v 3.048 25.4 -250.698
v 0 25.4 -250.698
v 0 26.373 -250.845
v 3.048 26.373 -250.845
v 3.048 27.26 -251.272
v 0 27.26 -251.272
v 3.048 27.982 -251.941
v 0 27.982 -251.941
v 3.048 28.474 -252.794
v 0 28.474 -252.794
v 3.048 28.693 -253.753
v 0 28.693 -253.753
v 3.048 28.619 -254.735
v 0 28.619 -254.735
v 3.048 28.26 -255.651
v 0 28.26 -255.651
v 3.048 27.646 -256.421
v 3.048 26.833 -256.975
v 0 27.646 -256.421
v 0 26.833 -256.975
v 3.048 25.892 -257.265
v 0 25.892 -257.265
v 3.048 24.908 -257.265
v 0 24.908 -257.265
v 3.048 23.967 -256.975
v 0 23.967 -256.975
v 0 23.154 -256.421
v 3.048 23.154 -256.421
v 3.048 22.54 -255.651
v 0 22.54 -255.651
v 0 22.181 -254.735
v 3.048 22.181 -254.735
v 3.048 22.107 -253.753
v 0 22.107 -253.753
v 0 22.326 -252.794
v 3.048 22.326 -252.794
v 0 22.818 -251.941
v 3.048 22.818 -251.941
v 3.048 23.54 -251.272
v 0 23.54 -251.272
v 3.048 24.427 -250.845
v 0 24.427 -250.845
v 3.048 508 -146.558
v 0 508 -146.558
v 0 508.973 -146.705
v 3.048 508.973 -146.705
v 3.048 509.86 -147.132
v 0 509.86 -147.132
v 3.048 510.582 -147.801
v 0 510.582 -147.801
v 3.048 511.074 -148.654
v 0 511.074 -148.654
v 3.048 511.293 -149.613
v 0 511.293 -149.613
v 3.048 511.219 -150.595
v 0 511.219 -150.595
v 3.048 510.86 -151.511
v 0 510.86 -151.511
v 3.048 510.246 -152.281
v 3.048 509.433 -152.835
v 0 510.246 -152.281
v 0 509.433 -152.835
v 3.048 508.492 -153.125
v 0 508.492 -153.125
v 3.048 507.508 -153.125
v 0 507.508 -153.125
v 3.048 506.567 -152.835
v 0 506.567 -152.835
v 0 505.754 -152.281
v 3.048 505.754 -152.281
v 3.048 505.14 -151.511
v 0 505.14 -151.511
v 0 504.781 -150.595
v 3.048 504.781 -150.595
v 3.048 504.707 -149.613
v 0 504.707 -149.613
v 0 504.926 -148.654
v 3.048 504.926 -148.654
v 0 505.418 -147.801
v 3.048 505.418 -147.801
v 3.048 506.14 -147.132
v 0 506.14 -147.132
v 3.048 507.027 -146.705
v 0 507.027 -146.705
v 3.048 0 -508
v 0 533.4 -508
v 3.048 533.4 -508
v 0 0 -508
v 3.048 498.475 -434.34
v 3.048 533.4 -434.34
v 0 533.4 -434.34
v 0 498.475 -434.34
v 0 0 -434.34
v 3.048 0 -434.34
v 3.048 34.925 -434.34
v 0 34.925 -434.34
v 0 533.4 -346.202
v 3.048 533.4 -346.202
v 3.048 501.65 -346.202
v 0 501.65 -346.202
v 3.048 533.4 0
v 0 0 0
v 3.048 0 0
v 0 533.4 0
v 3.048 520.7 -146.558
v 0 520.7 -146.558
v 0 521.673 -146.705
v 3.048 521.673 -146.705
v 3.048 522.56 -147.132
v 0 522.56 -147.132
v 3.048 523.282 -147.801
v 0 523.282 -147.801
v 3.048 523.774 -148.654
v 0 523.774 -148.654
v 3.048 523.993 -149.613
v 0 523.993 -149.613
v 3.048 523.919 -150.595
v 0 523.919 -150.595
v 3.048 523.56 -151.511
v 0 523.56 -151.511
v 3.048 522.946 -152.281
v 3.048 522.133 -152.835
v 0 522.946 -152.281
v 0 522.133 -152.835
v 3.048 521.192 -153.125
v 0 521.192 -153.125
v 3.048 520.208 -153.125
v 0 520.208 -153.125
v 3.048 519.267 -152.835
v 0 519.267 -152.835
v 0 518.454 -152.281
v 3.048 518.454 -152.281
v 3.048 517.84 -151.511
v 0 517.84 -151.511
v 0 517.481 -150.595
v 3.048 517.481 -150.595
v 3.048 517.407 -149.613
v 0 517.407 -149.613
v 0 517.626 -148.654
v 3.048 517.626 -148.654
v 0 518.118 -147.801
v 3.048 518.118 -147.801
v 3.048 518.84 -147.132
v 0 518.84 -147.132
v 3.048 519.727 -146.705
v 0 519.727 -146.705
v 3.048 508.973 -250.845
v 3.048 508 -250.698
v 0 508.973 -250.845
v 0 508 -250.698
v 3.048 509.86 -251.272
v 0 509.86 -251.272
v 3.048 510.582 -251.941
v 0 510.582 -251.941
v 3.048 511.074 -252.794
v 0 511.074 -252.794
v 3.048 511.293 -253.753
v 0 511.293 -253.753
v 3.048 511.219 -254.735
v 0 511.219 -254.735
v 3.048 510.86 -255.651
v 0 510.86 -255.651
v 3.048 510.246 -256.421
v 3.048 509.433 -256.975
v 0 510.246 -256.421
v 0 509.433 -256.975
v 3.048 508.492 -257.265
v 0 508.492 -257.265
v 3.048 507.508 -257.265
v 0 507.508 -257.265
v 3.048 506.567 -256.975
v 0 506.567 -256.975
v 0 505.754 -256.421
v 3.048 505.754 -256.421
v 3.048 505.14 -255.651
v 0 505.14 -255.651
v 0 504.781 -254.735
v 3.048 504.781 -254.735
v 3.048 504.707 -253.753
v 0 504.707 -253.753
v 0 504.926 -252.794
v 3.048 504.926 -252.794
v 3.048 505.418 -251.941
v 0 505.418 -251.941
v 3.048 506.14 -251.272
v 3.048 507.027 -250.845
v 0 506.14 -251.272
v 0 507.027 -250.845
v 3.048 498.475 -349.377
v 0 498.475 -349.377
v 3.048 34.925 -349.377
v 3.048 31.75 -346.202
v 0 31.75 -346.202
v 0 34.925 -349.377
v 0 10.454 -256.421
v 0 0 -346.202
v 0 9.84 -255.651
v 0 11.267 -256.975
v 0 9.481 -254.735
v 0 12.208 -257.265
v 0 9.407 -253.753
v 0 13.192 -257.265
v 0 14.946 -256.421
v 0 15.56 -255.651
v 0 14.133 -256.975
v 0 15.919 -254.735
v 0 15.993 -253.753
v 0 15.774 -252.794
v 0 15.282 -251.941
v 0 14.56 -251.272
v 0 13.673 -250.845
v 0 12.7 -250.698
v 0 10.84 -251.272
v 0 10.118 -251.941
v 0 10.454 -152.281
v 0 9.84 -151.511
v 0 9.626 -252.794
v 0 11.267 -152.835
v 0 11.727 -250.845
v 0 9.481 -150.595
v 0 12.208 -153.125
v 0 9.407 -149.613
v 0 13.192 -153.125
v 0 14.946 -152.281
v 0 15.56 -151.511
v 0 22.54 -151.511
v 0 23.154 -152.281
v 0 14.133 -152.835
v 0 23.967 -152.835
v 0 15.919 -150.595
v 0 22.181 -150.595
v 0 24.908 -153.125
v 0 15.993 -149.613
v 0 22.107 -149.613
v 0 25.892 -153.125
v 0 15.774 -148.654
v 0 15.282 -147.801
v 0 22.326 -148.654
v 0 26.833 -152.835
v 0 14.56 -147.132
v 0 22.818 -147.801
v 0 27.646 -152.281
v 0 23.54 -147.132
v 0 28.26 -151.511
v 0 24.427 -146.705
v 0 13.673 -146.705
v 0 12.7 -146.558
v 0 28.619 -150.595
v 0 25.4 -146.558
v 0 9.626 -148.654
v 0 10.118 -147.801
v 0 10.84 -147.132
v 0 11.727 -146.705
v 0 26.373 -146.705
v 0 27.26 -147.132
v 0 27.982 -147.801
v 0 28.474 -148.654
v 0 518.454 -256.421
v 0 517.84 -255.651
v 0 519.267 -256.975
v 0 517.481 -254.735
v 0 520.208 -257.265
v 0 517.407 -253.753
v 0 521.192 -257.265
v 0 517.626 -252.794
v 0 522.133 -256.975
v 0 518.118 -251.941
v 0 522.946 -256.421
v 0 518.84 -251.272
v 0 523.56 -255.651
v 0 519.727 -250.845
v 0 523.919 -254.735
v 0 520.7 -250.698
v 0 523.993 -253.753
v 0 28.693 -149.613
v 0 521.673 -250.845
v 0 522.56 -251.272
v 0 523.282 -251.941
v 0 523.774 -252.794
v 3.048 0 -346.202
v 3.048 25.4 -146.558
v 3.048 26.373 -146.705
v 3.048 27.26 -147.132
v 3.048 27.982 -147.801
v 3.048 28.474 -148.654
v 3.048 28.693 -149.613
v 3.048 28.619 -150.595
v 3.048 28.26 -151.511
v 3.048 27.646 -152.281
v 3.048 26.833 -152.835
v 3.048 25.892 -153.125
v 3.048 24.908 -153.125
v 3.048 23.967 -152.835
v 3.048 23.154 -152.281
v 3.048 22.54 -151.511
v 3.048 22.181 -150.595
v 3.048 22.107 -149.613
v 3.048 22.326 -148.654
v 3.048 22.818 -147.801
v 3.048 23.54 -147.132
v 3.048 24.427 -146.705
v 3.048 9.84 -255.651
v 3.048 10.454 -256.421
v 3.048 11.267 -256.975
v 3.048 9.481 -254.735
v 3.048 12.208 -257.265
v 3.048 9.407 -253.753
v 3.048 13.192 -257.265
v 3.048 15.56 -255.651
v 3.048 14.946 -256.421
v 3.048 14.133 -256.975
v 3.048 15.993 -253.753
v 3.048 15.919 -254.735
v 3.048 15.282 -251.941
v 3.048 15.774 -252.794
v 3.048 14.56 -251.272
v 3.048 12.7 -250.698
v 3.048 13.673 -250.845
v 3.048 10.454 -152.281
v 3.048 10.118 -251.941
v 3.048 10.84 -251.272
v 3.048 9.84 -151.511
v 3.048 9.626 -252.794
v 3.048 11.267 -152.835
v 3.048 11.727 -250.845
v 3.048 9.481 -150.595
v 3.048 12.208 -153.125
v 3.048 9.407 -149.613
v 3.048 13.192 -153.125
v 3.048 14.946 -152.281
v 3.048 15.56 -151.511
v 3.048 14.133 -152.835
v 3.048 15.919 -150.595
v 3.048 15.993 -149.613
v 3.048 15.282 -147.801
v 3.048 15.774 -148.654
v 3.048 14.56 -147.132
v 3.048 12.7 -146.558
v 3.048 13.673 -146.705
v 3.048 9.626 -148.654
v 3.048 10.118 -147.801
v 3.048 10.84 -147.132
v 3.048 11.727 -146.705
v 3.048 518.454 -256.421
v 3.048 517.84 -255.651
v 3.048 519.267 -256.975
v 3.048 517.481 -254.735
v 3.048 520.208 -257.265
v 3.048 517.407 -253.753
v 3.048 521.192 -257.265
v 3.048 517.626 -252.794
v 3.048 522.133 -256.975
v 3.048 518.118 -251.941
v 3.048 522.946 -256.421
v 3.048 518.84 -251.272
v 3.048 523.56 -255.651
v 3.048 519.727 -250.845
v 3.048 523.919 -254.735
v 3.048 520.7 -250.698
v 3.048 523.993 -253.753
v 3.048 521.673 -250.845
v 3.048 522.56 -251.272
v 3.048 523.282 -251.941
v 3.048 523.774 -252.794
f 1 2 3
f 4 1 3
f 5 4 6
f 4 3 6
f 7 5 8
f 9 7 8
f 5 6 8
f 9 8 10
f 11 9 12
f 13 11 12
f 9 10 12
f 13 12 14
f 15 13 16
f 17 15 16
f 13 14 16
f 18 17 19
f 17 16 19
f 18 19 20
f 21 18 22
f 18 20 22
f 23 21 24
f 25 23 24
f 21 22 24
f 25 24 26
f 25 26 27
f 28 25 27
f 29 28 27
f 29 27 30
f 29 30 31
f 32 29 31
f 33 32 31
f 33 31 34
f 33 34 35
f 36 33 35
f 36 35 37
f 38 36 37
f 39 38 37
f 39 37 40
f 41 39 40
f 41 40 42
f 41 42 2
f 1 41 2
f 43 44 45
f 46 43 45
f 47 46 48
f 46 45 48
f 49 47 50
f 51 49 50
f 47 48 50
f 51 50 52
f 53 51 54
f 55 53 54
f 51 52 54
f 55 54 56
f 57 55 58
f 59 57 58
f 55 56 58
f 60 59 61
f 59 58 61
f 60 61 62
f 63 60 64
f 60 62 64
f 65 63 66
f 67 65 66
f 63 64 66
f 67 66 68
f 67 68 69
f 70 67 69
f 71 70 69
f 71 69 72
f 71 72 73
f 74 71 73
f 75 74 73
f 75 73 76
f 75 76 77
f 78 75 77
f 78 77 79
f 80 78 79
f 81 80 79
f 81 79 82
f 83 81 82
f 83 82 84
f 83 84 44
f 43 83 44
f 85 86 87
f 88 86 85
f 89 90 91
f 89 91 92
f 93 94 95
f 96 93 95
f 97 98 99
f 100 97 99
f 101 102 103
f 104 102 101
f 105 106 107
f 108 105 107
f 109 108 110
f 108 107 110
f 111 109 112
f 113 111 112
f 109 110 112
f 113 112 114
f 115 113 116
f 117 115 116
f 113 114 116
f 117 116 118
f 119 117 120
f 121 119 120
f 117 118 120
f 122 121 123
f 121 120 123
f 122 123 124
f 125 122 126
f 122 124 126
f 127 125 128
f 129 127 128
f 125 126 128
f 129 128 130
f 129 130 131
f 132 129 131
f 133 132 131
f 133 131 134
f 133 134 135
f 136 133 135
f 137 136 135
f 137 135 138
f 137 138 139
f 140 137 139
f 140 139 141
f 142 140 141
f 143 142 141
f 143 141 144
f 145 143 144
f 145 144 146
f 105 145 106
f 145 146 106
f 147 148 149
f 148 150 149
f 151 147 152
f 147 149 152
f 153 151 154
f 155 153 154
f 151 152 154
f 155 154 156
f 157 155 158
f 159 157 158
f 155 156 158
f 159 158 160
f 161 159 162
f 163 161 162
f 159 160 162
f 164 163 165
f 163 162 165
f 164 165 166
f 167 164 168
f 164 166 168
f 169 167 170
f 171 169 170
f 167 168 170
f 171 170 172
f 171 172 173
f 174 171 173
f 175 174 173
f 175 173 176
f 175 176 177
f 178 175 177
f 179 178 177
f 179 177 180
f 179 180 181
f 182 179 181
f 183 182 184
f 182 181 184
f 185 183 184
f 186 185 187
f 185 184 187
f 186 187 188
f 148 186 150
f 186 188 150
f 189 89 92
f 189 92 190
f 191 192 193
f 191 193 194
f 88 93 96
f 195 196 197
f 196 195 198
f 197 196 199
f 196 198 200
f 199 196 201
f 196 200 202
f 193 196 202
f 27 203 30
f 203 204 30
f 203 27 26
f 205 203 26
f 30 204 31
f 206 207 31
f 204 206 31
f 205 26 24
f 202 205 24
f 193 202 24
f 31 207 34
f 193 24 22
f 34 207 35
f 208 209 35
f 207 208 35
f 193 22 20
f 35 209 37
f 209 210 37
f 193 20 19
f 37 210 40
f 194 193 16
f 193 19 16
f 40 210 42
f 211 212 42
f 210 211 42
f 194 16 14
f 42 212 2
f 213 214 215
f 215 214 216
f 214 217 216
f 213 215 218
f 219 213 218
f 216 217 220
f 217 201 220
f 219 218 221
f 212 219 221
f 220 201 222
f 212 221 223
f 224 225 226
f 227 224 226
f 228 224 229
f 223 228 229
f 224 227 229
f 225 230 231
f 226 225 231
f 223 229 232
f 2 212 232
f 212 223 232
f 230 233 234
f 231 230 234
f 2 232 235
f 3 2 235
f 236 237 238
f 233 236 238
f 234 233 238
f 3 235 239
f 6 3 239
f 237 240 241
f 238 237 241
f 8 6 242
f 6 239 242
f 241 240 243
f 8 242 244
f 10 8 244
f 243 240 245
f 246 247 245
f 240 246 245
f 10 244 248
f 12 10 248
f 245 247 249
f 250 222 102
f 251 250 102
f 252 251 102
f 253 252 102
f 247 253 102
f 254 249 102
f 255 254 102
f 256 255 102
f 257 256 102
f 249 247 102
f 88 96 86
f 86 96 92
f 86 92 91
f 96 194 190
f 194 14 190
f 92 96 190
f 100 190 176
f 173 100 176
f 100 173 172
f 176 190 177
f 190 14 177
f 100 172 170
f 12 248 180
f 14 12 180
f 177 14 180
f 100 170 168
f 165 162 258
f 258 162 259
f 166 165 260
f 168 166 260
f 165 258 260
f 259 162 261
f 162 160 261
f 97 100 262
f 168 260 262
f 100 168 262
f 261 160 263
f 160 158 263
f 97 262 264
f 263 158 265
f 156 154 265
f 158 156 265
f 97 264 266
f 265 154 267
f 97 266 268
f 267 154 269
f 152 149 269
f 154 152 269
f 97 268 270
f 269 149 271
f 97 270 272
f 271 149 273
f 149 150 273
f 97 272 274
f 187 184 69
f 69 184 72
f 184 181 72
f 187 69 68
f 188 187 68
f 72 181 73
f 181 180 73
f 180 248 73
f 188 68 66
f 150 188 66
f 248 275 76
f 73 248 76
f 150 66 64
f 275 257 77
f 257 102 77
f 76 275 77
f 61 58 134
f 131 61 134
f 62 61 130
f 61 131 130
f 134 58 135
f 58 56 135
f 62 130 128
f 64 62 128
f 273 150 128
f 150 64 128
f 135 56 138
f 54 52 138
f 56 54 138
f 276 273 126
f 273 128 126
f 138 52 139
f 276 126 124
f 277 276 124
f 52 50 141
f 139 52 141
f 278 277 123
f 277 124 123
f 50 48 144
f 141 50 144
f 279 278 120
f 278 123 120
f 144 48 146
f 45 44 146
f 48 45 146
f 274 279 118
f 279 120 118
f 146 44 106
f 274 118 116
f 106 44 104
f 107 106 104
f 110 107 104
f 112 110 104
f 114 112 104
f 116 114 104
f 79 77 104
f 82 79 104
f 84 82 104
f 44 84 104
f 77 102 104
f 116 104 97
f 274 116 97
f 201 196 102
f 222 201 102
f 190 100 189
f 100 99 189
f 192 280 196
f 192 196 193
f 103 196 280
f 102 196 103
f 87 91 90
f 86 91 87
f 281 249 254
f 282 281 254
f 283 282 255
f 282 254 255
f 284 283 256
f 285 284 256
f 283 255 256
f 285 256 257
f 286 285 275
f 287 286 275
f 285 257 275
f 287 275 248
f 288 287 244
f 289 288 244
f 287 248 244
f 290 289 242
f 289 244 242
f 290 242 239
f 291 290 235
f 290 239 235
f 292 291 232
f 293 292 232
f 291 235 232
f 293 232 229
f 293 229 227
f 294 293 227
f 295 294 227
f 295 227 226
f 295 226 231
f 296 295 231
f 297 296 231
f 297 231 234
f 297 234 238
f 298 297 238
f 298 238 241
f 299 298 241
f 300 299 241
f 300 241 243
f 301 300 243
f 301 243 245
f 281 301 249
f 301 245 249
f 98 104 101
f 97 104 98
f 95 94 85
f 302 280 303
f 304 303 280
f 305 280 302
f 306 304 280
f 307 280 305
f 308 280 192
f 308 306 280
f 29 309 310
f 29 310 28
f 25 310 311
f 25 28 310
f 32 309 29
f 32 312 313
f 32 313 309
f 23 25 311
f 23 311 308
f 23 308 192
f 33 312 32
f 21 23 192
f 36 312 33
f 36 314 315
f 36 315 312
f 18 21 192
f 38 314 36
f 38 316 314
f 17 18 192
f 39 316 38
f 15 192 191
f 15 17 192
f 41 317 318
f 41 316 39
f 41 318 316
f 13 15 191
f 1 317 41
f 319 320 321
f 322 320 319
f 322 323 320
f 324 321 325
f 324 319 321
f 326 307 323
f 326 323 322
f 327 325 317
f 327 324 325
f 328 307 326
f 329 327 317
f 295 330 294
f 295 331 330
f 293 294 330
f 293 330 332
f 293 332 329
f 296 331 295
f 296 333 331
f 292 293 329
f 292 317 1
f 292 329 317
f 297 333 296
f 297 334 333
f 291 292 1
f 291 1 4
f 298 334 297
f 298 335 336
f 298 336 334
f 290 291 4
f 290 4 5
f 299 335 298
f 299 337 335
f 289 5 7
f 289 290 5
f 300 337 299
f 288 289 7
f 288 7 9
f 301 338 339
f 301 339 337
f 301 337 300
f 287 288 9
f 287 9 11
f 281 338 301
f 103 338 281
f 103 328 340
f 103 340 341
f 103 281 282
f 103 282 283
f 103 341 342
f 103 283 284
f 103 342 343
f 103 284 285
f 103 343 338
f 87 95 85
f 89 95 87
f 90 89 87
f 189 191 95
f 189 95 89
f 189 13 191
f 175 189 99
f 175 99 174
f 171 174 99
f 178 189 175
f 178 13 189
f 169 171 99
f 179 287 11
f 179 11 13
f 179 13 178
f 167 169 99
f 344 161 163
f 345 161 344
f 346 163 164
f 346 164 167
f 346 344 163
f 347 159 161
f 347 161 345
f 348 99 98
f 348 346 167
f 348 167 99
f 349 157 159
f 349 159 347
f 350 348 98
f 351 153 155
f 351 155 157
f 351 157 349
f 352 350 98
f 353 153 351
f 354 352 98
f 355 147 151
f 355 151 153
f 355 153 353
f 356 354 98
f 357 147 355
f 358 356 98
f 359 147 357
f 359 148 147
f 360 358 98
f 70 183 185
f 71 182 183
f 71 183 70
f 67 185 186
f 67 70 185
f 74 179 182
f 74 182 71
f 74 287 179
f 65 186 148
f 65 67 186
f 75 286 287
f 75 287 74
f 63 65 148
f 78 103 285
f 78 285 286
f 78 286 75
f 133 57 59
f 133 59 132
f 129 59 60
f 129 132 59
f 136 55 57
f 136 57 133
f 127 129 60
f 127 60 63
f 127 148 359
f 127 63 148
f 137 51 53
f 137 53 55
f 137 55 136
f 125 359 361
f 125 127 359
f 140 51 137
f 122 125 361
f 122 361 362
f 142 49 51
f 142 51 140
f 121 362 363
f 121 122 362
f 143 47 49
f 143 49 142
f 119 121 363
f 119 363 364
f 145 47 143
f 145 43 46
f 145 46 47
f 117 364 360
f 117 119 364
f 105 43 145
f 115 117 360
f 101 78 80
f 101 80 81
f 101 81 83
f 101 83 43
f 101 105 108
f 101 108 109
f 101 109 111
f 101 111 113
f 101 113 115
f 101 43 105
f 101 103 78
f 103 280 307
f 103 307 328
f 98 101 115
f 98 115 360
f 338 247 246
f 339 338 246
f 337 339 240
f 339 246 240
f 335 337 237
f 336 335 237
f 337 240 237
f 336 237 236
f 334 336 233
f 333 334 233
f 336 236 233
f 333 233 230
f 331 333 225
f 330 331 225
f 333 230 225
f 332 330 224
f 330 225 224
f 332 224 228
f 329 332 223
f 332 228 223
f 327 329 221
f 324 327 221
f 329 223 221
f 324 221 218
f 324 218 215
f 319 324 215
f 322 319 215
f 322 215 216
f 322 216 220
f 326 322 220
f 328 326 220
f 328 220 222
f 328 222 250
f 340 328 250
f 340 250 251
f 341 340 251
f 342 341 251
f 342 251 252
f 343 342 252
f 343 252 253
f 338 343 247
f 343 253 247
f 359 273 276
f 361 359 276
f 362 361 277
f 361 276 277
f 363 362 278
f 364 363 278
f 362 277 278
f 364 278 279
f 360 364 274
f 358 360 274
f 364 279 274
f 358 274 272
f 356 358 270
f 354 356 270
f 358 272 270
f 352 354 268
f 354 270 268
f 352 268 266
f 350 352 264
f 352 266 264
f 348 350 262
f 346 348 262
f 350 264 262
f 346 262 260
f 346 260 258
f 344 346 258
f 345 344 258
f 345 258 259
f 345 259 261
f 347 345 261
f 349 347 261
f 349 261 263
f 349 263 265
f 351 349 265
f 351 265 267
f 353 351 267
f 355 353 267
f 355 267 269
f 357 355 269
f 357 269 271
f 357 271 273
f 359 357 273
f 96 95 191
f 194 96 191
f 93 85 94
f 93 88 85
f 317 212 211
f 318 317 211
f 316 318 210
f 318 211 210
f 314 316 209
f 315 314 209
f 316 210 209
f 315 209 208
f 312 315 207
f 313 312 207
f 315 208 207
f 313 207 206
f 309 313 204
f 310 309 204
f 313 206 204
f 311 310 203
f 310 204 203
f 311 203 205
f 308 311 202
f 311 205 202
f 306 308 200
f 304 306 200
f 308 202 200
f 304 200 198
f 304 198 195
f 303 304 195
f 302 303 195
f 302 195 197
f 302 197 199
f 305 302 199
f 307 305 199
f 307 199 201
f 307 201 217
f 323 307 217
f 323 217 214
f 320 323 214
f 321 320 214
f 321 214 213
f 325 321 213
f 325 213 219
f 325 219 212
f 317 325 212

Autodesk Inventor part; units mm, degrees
ref_plane "YZ Plane" through (0, 0, 0) normal (1, 0, 0) x (0, 1, 0)
ref_plane "XZ Plane" through (0, 0, 0) normal (0, 1, 0) x (-1, 0, 0)
ref_plane "XY Plane" through (0, 0, 0) normal (0, 0, 1) x (1, 0, 0)
sketch "Sketch1" plane through (0, 0, 0) normal (1, 0, 0) x (0, 1, 0)
  line L0 (0, 0) -> (533.4, 0)
  line L1 (533.4, 0) -> (533.4, -508)
  line L2 (533.4, -508) -> (0, -508)
  line L3 (0, -508) -> (0, 0)
  dimension "d0" = 533.4
  dimension "d1" = 508
extrude "Extrusion1" add sketch "Sketch1" along normal blind 1.5875
sketch "Sketch3" plane through (0, 0, 0) normal (-1, 0, 0) x (0, 0, 1)
  line L0 (-508, 0) -> (-508, 533.4) projected
  line L1 (0, 0) -> (-508, 0) projected
  circle A0 centre (-358.14, 12.7) radius 3.302
  circle A1 centre (-358.14, 25.4) radius 3.302
  circle A2 centre (-149.86, 12.7) radius 3.302
  circle A3 centre (-149.86, 25.4) radius 3.302
  circle A4 centre (-254, 12.7) radius 3.302
  circle A5 centre (-254, 25.4) radius 3.302
  circle A6 centre (-358.14, 508) radius 3.302
  circle A7 centre (-358.14, 520.7) radius 3.302
  circle A8 centre (-149.86, 508) radius 3.302
  circle A9 centre (-149.86, 520.7) radius 3.302
  circle A10 centre (-254, 508) radius 3.302
  circle A11 centre (-254, 520.7) radius 3.302
extrude "Extrusion5" cut sketch "Sketch3" against normal up to surface (1.5875 mm away) contours A0 | A1 | A2 | A3 | A4 | A5
sheet face with bend "Face1" sketch "Sketch1" thickness 3.048 toward (1, 0, 0) bend radius 3.048
bend "Bend1"
extrude "Cut1" cut sketch "Sketch3" against normal up to surface (3.048 mm away)
sketch "Sketch4" plane through (3.048, 0, 0) normal (1, 0, 0) x (0, 0, -1)
  line L0 (508, 533.4) -> (508, 0) projected
  line L1 (508, 266.7) -> (434.34, 266.7)
  line L2 (0, 0) -> (508, 0) projected
  line L3 (434.34, 0) -> (434.34, 34.925)
  line L4 (434.34, 0) -> (469.265, 0) construction
  line L5 (434.34, 34.925) -> (349.377, 34.925)
  line L6 (434.34, 17.4625) -> (346.202, 17.4625)
  line L7 (346.202, 0) -> (346.202, 31.75)
  line L8 (346.202, 31.75) -> (349.377, 34.925)
  line L9 (434.34, 533.4) -> (434.34, 498.475)
  line L10 (434.34, 498.475) -> (349.377, 498.475)
  line L11 (434.34, 515.9375) -> (346.202, 515.9375)
  line L12 (346.202, 533.4) -> (346.202, 501.65)
  line L13 (346.202, 501.65) -> (349.377, 498.475)
  line L14 (0, 533.4) -> (508, 533.4) projected
  line L15 (508, 0) -> (0, 0) projected
  dimension "d42" = 73.66
  dimension "d43" = 34.925
  dimension "d44" = 90
  dimension "d45" = 84.963
  dimension "d46" = 88.138
  dimension "d47" = 31.75
extrude "Cut2" cut sketch "Sketch4" against normal blind 3.048
equation "\"d38\" = Thickness"
equation "\"d48\" = Thickness"
equation "\"d32\" = Thickness"
equation "\"d33\" = BendRadius"
equation "\"d34\" = BendReliefWidth"
equation "\"d36\" = MinimumRemnant"
equation "\"d35\" = BendReliefDepth"
equation "\"d37\" = TransitionRadius"
equation "\"BendRadius\" = Thickness"
equation "\"BendReliefWidth\" = Thickness"
equation "\"BendReliefDepth\" = 0.5 * Thickness"
equation "\"CornerReliefSize\" = 4 * Thickness"
equation "\"MinimumRemnant\" = 2 * Thickness"
equation "\"TransitionRadius\" = BendRadius"
equation "\"JacobiRadiusSize\" = BendRadius"
equation "\"GapSize\" = Thickness"
equation "\"Thickness\" = 3.048"
properties part number "TopV5" material "Acrylic, Clear"
